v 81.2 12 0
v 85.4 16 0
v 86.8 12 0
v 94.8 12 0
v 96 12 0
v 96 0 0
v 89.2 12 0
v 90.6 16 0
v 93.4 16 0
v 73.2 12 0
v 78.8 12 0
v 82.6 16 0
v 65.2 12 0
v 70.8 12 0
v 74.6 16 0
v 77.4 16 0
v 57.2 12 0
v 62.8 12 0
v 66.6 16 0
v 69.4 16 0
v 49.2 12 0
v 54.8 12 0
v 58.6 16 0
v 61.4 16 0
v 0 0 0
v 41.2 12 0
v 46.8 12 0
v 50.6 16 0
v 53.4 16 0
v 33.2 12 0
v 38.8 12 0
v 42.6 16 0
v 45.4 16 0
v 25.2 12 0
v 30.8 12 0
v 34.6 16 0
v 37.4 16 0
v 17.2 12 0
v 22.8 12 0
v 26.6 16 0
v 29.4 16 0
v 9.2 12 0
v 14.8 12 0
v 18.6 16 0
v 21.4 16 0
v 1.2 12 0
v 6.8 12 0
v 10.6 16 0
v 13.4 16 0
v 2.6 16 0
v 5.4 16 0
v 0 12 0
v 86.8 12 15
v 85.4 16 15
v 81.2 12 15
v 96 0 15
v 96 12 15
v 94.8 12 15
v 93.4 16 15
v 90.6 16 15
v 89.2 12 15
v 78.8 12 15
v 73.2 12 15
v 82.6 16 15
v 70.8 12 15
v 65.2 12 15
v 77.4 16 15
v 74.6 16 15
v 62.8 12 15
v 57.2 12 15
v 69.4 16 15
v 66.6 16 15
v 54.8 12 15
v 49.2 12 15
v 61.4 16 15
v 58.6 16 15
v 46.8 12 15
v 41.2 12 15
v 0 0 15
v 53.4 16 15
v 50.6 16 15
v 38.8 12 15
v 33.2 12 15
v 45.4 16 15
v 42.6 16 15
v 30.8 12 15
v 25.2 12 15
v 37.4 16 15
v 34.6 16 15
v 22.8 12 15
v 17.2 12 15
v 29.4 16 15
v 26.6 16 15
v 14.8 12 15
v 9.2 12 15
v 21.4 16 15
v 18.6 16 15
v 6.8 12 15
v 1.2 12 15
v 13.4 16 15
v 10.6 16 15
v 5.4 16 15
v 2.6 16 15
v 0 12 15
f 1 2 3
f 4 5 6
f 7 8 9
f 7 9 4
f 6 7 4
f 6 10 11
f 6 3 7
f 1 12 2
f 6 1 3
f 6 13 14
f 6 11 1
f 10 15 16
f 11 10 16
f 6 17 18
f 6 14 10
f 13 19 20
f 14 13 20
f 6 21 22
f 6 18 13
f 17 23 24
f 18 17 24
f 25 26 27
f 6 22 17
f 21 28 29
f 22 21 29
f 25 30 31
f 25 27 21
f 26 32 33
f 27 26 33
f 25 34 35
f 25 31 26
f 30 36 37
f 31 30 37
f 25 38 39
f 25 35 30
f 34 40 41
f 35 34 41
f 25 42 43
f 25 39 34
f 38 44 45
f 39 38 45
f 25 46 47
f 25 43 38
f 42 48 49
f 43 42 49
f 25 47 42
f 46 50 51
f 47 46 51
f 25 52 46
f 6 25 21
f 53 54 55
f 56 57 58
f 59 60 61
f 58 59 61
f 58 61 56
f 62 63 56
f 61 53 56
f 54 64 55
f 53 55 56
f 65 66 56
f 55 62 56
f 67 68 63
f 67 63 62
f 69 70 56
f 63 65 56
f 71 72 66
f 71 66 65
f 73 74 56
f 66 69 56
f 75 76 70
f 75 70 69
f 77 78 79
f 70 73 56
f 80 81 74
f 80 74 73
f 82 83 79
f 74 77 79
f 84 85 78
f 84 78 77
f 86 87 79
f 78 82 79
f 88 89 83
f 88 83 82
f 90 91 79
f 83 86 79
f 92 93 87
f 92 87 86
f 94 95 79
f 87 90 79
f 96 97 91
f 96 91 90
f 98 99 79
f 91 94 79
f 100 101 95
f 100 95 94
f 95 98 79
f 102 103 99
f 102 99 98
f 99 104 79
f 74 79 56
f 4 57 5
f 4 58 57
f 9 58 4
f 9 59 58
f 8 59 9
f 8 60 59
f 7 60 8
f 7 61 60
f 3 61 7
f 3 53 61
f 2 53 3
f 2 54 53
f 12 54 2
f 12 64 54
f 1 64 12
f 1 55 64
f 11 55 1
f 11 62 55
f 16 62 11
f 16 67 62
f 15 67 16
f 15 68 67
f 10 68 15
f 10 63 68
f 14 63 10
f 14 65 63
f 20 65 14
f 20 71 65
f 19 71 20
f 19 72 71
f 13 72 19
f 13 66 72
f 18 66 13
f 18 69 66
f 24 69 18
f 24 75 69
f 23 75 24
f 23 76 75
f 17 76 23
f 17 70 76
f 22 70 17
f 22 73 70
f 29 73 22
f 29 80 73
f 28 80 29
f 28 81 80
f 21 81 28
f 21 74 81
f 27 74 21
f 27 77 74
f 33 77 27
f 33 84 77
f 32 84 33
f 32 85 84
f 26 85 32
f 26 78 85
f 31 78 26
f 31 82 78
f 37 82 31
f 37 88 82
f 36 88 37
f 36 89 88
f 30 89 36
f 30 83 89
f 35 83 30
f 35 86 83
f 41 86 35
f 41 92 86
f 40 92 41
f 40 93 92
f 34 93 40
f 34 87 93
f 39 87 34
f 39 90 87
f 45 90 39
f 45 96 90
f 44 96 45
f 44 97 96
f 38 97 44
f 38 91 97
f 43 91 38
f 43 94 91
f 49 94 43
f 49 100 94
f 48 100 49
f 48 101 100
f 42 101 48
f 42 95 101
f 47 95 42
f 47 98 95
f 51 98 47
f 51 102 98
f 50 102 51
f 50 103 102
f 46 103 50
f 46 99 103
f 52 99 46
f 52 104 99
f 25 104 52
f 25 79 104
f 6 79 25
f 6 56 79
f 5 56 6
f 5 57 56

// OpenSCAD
$fn = 32;

// ----------------------------------------------------------------------
// Gear rack: 12 teeth, pitch 8 mm
// ----------------------------------------------------------------------

// --- parameters (mm) ---
teeth = 12;               // number of teeth
pitch = 8;                // tooth pitch, X
root_w = 5.6;             // tooth width at the root
tip_w = 2.8;              // tooth width at the tip
base_h = 12;              // rack body height, Y
tooth_h = 4;              // tooth height above the body
plate_t = 15;             // rack width, Z (extrusion height)

rack_l = teeth * pitch;  // overall length
total_h = base_h + tooth_h;  // overall height

profile = [[0, 0], [96, 0], [96, 12], [94.8, 12], [93.4, 16], [90.6, 16], [89.2, 12], [86.8, 12], [85.4, 16], [82.6, 16], [81.2, 12], [78.8, 12], [77.4, 16], [74.6, 16], [73.2, 12], [70.8, 12], [69.4, 16], [66.6, 16], [65.2, 12], [62.8, 12], [61.4, 16], [58.6, 16], [57.2, 12], [54.8, 12], [53.4, 16], [50.6, 16], [49.2, 12], [46.8, 12], [45.4, 16], [42.6, 16], [41.2, 12], [38.8, 12], [37.4, 16], [34.6, 16], [33.2, 12], [30.8, 12], [29.4, 16], [26.6, 16], [25.2, 12], [22.8, 12], [21.4, 16], [18.6, 16], [17.2, 12], [14.8, 12], [13.4, 16], [10.6, 16], [9.2, 12], [6.8, 12], [5.4, 16], [2.6, 16], [1.2, 12], [0, 12]];  // primary outline, 52 points, counter clockwise

// --- the one profile operation ---
linear_extrude(height = plate_t) polygon(points = profile);
